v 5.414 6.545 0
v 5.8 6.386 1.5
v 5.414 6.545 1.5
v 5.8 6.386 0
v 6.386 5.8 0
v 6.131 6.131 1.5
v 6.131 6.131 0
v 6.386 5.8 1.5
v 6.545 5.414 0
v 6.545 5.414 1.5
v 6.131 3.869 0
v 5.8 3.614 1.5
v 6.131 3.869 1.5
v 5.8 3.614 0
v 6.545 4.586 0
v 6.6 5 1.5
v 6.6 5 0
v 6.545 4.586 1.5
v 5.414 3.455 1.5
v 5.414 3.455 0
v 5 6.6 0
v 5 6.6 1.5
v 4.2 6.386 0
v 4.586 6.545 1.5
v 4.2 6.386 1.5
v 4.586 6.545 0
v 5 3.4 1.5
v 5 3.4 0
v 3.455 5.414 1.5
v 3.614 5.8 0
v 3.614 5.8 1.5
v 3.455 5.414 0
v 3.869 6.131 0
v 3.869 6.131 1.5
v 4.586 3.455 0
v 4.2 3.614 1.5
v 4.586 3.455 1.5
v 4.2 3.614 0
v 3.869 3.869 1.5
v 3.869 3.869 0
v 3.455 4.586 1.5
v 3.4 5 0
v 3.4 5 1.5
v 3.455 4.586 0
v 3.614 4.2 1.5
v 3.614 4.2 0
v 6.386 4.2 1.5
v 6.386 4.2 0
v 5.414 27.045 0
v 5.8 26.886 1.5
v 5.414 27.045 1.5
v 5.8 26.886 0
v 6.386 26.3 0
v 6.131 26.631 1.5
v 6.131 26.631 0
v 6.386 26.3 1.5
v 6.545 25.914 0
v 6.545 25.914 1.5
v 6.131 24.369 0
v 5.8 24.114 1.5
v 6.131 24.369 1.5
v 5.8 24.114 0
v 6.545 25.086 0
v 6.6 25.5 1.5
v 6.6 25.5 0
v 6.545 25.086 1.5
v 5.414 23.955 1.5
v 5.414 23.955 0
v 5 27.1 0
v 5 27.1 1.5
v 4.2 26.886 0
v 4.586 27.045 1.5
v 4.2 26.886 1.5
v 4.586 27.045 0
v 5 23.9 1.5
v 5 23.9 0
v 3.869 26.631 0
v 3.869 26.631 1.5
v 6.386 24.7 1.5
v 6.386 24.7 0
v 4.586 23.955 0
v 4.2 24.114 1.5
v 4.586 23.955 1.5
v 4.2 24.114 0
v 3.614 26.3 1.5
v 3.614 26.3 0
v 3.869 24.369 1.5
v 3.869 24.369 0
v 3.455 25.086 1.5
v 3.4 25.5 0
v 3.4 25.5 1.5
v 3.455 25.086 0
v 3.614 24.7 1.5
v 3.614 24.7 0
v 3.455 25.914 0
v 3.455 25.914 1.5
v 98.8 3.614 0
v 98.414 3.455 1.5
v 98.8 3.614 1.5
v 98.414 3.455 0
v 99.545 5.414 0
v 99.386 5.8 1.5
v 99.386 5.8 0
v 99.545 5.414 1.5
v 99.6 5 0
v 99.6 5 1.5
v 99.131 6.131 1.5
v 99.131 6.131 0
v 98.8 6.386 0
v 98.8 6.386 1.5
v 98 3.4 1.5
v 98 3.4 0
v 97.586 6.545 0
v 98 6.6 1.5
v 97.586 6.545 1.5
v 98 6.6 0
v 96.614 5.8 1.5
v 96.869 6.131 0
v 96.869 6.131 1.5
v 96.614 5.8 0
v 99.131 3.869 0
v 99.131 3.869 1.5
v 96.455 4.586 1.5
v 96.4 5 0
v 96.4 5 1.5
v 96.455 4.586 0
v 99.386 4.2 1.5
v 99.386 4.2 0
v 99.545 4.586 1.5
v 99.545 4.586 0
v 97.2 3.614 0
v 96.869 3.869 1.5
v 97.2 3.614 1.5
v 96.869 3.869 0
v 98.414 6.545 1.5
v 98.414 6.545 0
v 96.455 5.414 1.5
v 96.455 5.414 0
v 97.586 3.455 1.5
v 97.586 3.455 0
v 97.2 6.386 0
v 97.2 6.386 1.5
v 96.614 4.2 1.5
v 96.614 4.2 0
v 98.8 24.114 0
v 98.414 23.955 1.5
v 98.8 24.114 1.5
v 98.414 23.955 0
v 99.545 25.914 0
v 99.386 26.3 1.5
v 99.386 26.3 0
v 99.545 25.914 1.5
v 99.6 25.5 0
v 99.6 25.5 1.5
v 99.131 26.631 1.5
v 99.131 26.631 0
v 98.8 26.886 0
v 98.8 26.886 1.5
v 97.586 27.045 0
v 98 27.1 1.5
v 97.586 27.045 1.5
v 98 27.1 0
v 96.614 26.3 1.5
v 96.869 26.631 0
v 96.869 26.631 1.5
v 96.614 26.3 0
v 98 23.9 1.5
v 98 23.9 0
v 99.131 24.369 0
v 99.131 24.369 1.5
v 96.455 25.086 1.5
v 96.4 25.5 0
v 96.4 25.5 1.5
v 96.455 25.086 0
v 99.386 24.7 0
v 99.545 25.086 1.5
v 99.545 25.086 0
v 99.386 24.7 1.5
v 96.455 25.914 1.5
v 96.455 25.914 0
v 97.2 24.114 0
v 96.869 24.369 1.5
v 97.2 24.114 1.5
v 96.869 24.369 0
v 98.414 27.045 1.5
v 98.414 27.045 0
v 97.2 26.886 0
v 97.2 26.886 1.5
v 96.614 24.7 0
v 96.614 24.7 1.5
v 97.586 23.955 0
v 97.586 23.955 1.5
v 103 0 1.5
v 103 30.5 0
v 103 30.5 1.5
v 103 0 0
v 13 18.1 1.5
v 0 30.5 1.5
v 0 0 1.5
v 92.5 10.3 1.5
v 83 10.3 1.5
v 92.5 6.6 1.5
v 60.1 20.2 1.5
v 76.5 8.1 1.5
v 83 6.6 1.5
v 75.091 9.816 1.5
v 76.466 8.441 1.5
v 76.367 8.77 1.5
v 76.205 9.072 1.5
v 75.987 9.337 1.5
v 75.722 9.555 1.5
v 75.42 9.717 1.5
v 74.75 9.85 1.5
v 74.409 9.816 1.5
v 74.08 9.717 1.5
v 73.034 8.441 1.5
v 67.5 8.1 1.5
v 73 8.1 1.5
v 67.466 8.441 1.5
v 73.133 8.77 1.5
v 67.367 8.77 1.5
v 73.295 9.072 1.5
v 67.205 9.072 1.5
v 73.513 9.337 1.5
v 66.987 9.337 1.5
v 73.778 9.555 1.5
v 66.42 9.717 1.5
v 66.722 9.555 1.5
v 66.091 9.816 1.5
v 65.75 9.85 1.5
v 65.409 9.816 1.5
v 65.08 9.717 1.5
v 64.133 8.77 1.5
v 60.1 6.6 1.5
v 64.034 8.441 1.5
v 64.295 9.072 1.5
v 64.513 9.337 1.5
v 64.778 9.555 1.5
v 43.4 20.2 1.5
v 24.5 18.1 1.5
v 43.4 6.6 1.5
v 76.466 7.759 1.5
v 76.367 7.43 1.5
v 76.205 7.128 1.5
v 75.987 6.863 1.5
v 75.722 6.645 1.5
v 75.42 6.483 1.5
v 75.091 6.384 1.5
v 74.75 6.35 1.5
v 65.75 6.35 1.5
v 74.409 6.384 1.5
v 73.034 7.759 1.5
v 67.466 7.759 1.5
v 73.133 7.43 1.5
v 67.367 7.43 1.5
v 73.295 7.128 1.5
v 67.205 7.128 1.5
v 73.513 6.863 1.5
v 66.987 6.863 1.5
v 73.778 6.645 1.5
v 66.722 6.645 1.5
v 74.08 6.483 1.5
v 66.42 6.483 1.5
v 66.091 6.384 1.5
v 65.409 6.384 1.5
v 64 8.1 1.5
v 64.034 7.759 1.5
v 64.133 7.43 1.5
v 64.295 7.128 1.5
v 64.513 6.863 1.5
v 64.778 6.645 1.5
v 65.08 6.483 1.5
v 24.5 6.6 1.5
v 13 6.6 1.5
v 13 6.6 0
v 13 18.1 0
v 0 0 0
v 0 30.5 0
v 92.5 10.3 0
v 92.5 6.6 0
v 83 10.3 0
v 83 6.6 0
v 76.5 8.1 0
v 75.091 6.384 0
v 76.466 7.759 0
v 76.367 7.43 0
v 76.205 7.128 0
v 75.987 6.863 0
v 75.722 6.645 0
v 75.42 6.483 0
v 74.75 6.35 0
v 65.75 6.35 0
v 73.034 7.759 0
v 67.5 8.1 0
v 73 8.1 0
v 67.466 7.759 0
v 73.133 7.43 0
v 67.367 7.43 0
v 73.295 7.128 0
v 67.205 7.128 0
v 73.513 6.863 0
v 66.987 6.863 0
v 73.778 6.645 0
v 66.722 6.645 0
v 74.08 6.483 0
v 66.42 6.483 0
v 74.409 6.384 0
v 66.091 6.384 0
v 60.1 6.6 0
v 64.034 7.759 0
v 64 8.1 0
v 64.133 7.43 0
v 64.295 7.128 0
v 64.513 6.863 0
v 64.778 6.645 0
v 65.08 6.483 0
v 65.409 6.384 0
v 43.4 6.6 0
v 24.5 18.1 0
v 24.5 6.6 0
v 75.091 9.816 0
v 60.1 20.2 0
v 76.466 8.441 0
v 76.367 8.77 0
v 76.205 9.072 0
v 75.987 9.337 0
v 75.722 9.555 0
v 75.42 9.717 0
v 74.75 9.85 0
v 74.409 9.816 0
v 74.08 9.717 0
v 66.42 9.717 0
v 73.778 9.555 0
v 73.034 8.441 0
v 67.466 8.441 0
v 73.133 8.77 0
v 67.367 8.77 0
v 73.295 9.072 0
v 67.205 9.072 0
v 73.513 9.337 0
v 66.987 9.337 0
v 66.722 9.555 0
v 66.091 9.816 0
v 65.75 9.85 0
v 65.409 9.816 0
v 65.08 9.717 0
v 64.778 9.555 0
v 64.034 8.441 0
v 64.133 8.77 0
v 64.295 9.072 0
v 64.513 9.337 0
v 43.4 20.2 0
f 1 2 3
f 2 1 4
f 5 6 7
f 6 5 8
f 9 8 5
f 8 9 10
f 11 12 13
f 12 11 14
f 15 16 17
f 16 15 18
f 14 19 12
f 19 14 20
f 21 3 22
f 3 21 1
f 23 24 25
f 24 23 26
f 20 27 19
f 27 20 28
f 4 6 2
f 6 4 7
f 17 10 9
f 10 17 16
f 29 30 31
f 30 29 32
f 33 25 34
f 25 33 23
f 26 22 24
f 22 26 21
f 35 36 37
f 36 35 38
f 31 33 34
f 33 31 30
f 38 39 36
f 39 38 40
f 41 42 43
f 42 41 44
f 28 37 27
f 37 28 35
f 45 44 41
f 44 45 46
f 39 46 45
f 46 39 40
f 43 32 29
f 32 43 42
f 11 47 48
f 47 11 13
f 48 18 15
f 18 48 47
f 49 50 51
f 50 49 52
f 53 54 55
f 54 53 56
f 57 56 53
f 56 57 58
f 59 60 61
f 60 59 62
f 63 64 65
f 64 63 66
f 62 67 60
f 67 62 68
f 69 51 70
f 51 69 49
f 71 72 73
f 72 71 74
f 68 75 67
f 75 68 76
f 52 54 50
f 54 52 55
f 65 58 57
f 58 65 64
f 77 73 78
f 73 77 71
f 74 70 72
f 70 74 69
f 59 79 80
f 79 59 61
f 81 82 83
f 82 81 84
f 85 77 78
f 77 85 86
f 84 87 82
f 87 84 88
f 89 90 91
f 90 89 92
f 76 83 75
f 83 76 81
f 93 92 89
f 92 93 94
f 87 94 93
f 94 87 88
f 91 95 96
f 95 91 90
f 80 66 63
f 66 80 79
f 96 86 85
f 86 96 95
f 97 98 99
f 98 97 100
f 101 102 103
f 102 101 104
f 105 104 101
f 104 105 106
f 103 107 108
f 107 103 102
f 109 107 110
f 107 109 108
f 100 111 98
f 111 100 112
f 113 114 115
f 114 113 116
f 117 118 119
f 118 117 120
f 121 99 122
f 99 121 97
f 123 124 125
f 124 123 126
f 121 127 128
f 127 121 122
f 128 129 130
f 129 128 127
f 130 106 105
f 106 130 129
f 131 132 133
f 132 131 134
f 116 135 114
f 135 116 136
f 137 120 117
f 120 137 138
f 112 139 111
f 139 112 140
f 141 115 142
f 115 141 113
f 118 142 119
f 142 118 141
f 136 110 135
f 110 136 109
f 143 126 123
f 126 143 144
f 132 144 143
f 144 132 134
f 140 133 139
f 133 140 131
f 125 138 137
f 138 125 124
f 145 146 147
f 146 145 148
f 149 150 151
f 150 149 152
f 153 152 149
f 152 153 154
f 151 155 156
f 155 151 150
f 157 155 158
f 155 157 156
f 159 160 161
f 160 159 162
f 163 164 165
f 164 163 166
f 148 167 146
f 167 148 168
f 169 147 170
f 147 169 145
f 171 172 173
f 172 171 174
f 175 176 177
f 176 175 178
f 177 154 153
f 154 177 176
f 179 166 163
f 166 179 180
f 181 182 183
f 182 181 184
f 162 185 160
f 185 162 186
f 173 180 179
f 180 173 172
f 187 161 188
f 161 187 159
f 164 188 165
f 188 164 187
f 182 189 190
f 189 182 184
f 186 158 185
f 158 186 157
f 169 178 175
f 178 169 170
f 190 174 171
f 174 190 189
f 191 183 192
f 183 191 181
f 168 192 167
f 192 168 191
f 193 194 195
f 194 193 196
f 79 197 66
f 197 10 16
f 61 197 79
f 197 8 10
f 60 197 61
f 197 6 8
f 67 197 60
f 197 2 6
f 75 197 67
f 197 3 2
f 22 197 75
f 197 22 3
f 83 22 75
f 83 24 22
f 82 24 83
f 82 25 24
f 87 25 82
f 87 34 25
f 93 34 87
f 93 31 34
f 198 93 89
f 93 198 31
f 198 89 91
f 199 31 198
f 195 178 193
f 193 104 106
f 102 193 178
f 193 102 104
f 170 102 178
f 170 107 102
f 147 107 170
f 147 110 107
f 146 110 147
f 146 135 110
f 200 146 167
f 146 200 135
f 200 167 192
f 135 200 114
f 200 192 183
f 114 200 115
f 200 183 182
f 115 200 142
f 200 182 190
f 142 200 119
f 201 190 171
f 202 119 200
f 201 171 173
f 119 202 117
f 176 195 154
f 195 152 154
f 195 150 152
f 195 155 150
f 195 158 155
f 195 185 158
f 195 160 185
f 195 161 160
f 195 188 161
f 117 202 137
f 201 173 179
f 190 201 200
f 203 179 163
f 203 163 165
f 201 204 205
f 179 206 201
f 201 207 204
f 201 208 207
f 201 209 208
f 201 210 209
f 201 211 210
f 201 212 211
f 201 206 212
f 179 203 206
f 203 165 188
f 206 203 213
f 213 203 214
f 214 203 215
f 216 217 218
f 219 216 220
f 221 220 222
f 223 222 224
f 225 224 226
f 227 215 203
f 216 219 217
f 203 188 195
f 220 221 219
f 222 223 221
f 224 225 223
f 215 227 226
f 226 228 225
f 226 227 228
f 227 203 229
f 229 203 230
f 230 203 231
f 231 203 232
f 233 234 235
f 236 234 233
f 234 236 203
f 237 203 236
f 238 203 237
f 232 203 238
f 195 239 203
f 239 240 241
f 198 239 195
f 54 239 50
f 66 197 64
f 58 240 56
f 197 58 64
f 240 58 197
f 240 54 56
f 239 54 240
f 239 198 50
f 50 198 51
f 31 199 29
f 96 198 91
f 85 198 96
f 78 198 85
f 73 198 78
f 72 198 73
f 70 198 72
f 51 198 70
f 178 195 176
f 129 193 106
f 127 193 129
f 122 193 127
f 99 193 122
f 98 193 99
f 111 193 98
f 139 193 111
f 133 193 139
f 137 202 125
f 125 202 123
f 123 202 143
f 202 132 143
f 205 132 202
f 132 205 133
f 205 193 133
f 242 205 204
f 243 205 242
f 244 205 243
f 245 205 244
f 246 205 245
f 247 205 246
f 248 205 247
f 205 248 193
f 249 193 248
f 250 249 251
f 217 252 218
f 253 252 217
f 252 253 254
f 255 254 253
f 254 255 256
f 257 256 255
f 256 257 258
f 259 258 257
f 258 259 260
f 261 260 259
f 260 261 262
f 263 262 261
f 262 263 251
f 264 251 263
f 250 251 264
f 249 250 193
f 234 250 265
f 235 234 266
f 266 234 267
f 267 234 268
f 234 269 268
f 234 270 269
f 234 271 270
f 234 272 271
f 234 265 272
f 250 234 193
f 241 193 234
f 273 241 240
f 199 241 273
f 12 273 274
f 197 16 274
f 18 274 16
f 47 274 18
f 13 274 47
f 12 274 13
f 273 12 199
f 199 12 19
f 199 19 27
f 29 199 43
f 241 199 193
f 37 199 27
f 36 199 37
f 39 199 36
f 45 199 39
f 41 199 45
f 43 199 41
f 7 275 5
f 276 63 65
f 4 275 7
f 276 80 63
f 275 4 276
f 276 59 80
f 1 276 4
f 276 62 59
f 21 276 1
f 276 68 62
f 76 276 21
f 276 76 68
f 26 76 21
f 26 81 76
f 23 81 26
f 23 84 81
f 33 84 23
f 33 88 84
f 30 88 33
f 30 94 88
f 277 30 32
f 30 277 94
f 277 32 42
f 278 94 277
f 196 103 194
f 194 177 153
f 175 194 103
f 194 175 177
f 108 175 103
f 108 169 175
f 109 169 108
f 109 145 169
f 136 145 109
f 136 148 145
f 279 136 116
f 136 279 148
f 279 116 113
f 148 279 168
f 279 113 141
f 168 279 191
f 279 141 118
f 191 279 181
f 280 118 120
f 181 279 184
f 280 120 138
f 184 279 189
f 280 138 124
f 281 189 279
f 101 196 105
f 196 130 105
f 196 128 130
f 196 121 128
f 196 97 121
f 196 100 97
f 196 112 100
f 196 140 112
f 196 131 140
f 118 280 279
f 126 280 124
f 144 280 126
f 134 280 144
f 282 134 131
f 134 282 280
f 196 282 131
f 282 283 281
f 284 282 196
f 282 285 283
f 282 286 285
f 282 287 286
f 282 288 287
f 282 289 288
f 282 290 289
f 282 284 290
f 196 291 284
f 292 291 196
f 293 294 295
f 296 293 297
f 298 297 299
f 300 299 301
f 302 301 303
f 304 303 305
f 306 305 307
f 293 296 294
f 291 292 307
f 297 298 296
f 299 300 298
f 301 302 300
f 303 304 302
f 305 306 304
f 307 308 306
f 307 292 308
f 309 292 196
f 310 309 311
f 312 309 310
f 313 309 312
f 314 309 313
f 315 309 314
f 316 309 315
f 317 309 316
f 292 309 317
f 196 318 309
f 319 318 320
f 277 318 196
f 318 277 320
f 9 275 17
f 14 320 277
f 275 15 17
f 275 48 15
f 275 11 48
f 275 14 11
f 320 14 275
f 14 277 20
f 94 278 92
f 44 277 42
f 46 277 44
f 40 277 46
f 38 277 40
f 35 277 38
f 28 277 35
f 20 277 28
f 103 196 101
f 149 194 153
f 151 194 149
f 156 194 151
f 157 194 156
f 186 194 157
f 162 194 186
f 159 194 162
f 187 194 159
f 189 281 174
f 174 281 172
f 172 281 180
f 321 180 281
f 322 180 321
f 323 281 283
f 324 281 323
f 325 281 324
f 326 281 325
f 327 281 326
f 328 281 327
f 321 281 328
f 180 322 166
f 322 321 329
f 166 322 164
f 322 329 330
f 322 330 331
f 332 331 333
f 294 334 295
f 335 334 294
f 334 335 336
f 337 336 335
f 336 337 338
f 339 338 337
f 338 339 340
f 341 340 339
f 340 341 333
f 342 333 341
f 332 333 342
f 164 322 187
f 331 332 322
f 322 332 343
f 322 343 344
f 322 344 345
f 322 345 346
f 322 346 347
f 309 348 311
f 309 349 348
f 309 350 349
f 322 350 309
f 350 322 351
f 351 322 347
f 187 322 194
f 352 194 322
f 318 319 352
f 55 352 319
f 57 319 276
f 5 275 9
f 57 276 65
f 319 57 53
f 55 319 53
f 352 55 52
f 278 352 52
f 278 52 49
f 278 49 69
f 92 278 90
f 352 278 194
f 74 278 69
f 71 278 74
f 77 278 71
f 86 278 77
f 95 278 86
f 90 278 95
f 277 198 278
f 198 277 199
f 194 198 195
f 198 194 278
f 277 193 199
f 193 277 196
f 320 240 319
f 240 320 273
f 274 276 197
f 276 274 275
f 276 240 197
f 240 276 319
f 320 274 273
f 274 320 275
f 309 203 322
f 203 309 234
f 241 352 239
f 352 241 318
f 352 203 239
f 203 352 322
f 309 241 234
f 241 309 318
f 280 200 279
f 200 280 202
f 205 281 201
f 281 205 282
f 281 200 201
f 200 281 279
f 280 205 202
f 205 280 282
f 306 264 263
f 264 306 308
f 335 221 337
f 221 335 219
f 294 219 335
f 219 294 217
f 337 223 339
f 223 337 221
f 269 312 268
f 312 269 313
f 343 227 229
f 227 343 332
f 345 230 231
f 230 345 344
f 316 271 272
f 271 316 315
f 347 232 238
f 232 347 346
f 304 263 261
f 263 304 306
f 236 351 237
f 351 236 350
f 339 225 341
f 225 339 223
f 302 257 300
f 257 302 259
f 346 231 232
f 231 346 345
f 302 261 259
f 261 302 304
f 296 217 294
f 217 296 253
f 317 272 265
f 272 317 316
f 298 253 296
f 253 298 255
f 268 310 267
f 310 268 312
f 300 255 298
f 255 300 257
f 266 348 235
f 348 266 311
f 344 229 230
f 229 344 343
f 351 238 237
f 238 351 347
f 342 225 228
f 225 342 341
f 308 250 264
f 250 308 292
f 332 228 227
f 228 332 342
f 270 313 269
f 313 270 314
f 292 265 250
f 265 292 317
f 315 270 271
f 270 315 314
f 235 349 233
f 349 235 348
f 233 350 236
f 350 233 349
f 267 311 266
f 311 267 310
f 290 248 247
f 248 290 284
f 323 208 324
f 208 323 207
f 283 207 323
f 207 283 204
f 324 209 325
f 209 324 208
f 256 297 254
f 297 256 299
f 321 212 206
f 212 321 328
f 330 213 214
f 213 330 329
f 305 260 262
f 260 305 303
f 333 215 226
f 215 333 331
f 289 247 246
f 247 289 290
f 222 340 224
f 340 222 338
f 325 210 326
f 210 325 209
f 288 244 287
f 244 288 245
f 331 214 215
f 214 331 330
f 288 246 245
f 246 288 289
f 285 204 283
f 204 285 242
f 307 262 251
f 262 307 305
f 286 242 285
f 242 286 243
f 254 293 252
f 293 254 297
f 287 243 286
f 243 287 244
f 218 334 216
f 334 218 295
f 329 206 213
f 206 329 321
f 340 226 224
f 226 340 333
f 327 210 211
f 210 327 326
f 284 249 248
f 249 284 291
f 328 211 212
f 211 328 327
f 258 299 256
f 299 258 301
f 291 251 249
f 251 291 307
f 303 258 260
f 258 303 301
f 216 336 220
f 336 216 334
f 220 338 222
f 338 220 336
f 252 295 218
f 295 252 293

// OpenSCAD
// Granit — Hammond 1455 end plate with connector cutouts
// Parametric: works for both slim (1455L) and wide (1455T) variants
//
// PCB connector edge is at X=112 in KiCad (right edge of board).
// PCB Y-axis maps to end plate X-axis.
// All connector cutouts are bottom-aligned to PCB surface.

/* [Case Variant] */
variant = "slim"; // [slim, wide]

/* [Plate Dimensions (from Hammond datasheet)] */
plate_w = (variant == "slim") ? 103 : 165;
plate_h = (variant == "slim") ? 30.5 : 51.5;
plate_t = 1.5;

screw_d = 3.2;
screw_inset_x = 5.0;
screw_inset_y = 5.0;

/* [PCB Position Inside Case] */
board_len = 99.5;
pcb_offset_x = 0;
pcb_bottom_y = 5.0;  // standoff height
pcb_t = 1.6;

// Y coordinate of PCB surface on the end plate
pcb_surface_y = pcb_bottom_y + pcb_t;

/* [Connector Cutouts] */
// Positions: KiCad Y from PCB dimension annotations (measured from board corner)
// Heights: from component datasheets (total body height above PCB)

// Barrel Jack (J7) — 694106301002, 17mm from connector edge
bj_pcb_y = 103;
bj_w     = 11.0;
bj_h     = 11.0;  // body height above PCB

// RJ45 Ethernet (J8) — HR911130A, 50mm from connector edge
rj45_pcb_y = 70;
rj45_w     = 16.2;
rj45_h     = 13.1;  // body height above PCB

// USB-C (J1) — USB4105-GF-A, 86mm from connector edge
usbc_pcb_y = 34;
usbc_w     = 9.0;
usbc_h     = 3.2;  // receptacle height

// Button (SW1) — SKRTLAE010, 64mm from connector edge
btn_pcb_y = 56;
btn_d     = 3.0;

// NeoPixel LED (D1) — WS2812B + light pipe, 73mm from connector edge
led_pcb_y = 47;
led_d     = 3.0;  // same as button for clean look

// Button and LED hole center height (same for both, custom light pipe)
btn_led_center_h = 1.5;  // above PCB surface

/* [Tolerances] */
clearance = 0.5;

// ============================================================

function pcb_y_to_plate_x(kicad_y) =
    (plate_w - board_len) / 2 + pcb_offset_x + (board_len - (kicad_y - 20.5));

module plate() {
    cube([plate_w, plate_h, plate_t]);
}

module screw_holes() {
    for (px = [screw_inset_x, plate_w - screw_inset_x])
        for (py = [screw_inset_y, plate_h - screw_inset_y])
            translate([px, py, -1])
                cylinder(d=screw_d, h=plate_t+2, $fn=24);
}

// Rectangular cutout, bottom-aligned to PCB surface
module rect_cutout(kicad_y, w, h) {
    c = clearance;
    px = pcb_y_to_plate_x(kicad_y);
    translate([px - (w+c)/2, pcb_surface_y, -1])
        cube([w+c, h+c, plate_t+2]);
}

// Round cutout at fixed height above PCB
module round_cutout(kicad_y, d, center_h) {
    c = clearance;
    px = pcb_y_to_plate_x(kicad_y);
    py = pcb_surface_y + center_h;
    translate([px, py, -1])
        cylinder(d=d+c, h=plate_t+2, $fn=32);
}

difference() {
    plate();
    screw_holes();
    rect_cutout(bj_pcb_y,   bj_w,   bj_h);
    rect_cutout(rj45_pcb_y, rj45_w, rj45_h);
    rect_cutout(usbc_pcb_y, usbc_w, usbc_h);
    round_cutout(btn_pcb_y, btn_d, btn_led_center_h);
    round_cutout(led_pcb_y, led_d, btn_led_center_h);
}
